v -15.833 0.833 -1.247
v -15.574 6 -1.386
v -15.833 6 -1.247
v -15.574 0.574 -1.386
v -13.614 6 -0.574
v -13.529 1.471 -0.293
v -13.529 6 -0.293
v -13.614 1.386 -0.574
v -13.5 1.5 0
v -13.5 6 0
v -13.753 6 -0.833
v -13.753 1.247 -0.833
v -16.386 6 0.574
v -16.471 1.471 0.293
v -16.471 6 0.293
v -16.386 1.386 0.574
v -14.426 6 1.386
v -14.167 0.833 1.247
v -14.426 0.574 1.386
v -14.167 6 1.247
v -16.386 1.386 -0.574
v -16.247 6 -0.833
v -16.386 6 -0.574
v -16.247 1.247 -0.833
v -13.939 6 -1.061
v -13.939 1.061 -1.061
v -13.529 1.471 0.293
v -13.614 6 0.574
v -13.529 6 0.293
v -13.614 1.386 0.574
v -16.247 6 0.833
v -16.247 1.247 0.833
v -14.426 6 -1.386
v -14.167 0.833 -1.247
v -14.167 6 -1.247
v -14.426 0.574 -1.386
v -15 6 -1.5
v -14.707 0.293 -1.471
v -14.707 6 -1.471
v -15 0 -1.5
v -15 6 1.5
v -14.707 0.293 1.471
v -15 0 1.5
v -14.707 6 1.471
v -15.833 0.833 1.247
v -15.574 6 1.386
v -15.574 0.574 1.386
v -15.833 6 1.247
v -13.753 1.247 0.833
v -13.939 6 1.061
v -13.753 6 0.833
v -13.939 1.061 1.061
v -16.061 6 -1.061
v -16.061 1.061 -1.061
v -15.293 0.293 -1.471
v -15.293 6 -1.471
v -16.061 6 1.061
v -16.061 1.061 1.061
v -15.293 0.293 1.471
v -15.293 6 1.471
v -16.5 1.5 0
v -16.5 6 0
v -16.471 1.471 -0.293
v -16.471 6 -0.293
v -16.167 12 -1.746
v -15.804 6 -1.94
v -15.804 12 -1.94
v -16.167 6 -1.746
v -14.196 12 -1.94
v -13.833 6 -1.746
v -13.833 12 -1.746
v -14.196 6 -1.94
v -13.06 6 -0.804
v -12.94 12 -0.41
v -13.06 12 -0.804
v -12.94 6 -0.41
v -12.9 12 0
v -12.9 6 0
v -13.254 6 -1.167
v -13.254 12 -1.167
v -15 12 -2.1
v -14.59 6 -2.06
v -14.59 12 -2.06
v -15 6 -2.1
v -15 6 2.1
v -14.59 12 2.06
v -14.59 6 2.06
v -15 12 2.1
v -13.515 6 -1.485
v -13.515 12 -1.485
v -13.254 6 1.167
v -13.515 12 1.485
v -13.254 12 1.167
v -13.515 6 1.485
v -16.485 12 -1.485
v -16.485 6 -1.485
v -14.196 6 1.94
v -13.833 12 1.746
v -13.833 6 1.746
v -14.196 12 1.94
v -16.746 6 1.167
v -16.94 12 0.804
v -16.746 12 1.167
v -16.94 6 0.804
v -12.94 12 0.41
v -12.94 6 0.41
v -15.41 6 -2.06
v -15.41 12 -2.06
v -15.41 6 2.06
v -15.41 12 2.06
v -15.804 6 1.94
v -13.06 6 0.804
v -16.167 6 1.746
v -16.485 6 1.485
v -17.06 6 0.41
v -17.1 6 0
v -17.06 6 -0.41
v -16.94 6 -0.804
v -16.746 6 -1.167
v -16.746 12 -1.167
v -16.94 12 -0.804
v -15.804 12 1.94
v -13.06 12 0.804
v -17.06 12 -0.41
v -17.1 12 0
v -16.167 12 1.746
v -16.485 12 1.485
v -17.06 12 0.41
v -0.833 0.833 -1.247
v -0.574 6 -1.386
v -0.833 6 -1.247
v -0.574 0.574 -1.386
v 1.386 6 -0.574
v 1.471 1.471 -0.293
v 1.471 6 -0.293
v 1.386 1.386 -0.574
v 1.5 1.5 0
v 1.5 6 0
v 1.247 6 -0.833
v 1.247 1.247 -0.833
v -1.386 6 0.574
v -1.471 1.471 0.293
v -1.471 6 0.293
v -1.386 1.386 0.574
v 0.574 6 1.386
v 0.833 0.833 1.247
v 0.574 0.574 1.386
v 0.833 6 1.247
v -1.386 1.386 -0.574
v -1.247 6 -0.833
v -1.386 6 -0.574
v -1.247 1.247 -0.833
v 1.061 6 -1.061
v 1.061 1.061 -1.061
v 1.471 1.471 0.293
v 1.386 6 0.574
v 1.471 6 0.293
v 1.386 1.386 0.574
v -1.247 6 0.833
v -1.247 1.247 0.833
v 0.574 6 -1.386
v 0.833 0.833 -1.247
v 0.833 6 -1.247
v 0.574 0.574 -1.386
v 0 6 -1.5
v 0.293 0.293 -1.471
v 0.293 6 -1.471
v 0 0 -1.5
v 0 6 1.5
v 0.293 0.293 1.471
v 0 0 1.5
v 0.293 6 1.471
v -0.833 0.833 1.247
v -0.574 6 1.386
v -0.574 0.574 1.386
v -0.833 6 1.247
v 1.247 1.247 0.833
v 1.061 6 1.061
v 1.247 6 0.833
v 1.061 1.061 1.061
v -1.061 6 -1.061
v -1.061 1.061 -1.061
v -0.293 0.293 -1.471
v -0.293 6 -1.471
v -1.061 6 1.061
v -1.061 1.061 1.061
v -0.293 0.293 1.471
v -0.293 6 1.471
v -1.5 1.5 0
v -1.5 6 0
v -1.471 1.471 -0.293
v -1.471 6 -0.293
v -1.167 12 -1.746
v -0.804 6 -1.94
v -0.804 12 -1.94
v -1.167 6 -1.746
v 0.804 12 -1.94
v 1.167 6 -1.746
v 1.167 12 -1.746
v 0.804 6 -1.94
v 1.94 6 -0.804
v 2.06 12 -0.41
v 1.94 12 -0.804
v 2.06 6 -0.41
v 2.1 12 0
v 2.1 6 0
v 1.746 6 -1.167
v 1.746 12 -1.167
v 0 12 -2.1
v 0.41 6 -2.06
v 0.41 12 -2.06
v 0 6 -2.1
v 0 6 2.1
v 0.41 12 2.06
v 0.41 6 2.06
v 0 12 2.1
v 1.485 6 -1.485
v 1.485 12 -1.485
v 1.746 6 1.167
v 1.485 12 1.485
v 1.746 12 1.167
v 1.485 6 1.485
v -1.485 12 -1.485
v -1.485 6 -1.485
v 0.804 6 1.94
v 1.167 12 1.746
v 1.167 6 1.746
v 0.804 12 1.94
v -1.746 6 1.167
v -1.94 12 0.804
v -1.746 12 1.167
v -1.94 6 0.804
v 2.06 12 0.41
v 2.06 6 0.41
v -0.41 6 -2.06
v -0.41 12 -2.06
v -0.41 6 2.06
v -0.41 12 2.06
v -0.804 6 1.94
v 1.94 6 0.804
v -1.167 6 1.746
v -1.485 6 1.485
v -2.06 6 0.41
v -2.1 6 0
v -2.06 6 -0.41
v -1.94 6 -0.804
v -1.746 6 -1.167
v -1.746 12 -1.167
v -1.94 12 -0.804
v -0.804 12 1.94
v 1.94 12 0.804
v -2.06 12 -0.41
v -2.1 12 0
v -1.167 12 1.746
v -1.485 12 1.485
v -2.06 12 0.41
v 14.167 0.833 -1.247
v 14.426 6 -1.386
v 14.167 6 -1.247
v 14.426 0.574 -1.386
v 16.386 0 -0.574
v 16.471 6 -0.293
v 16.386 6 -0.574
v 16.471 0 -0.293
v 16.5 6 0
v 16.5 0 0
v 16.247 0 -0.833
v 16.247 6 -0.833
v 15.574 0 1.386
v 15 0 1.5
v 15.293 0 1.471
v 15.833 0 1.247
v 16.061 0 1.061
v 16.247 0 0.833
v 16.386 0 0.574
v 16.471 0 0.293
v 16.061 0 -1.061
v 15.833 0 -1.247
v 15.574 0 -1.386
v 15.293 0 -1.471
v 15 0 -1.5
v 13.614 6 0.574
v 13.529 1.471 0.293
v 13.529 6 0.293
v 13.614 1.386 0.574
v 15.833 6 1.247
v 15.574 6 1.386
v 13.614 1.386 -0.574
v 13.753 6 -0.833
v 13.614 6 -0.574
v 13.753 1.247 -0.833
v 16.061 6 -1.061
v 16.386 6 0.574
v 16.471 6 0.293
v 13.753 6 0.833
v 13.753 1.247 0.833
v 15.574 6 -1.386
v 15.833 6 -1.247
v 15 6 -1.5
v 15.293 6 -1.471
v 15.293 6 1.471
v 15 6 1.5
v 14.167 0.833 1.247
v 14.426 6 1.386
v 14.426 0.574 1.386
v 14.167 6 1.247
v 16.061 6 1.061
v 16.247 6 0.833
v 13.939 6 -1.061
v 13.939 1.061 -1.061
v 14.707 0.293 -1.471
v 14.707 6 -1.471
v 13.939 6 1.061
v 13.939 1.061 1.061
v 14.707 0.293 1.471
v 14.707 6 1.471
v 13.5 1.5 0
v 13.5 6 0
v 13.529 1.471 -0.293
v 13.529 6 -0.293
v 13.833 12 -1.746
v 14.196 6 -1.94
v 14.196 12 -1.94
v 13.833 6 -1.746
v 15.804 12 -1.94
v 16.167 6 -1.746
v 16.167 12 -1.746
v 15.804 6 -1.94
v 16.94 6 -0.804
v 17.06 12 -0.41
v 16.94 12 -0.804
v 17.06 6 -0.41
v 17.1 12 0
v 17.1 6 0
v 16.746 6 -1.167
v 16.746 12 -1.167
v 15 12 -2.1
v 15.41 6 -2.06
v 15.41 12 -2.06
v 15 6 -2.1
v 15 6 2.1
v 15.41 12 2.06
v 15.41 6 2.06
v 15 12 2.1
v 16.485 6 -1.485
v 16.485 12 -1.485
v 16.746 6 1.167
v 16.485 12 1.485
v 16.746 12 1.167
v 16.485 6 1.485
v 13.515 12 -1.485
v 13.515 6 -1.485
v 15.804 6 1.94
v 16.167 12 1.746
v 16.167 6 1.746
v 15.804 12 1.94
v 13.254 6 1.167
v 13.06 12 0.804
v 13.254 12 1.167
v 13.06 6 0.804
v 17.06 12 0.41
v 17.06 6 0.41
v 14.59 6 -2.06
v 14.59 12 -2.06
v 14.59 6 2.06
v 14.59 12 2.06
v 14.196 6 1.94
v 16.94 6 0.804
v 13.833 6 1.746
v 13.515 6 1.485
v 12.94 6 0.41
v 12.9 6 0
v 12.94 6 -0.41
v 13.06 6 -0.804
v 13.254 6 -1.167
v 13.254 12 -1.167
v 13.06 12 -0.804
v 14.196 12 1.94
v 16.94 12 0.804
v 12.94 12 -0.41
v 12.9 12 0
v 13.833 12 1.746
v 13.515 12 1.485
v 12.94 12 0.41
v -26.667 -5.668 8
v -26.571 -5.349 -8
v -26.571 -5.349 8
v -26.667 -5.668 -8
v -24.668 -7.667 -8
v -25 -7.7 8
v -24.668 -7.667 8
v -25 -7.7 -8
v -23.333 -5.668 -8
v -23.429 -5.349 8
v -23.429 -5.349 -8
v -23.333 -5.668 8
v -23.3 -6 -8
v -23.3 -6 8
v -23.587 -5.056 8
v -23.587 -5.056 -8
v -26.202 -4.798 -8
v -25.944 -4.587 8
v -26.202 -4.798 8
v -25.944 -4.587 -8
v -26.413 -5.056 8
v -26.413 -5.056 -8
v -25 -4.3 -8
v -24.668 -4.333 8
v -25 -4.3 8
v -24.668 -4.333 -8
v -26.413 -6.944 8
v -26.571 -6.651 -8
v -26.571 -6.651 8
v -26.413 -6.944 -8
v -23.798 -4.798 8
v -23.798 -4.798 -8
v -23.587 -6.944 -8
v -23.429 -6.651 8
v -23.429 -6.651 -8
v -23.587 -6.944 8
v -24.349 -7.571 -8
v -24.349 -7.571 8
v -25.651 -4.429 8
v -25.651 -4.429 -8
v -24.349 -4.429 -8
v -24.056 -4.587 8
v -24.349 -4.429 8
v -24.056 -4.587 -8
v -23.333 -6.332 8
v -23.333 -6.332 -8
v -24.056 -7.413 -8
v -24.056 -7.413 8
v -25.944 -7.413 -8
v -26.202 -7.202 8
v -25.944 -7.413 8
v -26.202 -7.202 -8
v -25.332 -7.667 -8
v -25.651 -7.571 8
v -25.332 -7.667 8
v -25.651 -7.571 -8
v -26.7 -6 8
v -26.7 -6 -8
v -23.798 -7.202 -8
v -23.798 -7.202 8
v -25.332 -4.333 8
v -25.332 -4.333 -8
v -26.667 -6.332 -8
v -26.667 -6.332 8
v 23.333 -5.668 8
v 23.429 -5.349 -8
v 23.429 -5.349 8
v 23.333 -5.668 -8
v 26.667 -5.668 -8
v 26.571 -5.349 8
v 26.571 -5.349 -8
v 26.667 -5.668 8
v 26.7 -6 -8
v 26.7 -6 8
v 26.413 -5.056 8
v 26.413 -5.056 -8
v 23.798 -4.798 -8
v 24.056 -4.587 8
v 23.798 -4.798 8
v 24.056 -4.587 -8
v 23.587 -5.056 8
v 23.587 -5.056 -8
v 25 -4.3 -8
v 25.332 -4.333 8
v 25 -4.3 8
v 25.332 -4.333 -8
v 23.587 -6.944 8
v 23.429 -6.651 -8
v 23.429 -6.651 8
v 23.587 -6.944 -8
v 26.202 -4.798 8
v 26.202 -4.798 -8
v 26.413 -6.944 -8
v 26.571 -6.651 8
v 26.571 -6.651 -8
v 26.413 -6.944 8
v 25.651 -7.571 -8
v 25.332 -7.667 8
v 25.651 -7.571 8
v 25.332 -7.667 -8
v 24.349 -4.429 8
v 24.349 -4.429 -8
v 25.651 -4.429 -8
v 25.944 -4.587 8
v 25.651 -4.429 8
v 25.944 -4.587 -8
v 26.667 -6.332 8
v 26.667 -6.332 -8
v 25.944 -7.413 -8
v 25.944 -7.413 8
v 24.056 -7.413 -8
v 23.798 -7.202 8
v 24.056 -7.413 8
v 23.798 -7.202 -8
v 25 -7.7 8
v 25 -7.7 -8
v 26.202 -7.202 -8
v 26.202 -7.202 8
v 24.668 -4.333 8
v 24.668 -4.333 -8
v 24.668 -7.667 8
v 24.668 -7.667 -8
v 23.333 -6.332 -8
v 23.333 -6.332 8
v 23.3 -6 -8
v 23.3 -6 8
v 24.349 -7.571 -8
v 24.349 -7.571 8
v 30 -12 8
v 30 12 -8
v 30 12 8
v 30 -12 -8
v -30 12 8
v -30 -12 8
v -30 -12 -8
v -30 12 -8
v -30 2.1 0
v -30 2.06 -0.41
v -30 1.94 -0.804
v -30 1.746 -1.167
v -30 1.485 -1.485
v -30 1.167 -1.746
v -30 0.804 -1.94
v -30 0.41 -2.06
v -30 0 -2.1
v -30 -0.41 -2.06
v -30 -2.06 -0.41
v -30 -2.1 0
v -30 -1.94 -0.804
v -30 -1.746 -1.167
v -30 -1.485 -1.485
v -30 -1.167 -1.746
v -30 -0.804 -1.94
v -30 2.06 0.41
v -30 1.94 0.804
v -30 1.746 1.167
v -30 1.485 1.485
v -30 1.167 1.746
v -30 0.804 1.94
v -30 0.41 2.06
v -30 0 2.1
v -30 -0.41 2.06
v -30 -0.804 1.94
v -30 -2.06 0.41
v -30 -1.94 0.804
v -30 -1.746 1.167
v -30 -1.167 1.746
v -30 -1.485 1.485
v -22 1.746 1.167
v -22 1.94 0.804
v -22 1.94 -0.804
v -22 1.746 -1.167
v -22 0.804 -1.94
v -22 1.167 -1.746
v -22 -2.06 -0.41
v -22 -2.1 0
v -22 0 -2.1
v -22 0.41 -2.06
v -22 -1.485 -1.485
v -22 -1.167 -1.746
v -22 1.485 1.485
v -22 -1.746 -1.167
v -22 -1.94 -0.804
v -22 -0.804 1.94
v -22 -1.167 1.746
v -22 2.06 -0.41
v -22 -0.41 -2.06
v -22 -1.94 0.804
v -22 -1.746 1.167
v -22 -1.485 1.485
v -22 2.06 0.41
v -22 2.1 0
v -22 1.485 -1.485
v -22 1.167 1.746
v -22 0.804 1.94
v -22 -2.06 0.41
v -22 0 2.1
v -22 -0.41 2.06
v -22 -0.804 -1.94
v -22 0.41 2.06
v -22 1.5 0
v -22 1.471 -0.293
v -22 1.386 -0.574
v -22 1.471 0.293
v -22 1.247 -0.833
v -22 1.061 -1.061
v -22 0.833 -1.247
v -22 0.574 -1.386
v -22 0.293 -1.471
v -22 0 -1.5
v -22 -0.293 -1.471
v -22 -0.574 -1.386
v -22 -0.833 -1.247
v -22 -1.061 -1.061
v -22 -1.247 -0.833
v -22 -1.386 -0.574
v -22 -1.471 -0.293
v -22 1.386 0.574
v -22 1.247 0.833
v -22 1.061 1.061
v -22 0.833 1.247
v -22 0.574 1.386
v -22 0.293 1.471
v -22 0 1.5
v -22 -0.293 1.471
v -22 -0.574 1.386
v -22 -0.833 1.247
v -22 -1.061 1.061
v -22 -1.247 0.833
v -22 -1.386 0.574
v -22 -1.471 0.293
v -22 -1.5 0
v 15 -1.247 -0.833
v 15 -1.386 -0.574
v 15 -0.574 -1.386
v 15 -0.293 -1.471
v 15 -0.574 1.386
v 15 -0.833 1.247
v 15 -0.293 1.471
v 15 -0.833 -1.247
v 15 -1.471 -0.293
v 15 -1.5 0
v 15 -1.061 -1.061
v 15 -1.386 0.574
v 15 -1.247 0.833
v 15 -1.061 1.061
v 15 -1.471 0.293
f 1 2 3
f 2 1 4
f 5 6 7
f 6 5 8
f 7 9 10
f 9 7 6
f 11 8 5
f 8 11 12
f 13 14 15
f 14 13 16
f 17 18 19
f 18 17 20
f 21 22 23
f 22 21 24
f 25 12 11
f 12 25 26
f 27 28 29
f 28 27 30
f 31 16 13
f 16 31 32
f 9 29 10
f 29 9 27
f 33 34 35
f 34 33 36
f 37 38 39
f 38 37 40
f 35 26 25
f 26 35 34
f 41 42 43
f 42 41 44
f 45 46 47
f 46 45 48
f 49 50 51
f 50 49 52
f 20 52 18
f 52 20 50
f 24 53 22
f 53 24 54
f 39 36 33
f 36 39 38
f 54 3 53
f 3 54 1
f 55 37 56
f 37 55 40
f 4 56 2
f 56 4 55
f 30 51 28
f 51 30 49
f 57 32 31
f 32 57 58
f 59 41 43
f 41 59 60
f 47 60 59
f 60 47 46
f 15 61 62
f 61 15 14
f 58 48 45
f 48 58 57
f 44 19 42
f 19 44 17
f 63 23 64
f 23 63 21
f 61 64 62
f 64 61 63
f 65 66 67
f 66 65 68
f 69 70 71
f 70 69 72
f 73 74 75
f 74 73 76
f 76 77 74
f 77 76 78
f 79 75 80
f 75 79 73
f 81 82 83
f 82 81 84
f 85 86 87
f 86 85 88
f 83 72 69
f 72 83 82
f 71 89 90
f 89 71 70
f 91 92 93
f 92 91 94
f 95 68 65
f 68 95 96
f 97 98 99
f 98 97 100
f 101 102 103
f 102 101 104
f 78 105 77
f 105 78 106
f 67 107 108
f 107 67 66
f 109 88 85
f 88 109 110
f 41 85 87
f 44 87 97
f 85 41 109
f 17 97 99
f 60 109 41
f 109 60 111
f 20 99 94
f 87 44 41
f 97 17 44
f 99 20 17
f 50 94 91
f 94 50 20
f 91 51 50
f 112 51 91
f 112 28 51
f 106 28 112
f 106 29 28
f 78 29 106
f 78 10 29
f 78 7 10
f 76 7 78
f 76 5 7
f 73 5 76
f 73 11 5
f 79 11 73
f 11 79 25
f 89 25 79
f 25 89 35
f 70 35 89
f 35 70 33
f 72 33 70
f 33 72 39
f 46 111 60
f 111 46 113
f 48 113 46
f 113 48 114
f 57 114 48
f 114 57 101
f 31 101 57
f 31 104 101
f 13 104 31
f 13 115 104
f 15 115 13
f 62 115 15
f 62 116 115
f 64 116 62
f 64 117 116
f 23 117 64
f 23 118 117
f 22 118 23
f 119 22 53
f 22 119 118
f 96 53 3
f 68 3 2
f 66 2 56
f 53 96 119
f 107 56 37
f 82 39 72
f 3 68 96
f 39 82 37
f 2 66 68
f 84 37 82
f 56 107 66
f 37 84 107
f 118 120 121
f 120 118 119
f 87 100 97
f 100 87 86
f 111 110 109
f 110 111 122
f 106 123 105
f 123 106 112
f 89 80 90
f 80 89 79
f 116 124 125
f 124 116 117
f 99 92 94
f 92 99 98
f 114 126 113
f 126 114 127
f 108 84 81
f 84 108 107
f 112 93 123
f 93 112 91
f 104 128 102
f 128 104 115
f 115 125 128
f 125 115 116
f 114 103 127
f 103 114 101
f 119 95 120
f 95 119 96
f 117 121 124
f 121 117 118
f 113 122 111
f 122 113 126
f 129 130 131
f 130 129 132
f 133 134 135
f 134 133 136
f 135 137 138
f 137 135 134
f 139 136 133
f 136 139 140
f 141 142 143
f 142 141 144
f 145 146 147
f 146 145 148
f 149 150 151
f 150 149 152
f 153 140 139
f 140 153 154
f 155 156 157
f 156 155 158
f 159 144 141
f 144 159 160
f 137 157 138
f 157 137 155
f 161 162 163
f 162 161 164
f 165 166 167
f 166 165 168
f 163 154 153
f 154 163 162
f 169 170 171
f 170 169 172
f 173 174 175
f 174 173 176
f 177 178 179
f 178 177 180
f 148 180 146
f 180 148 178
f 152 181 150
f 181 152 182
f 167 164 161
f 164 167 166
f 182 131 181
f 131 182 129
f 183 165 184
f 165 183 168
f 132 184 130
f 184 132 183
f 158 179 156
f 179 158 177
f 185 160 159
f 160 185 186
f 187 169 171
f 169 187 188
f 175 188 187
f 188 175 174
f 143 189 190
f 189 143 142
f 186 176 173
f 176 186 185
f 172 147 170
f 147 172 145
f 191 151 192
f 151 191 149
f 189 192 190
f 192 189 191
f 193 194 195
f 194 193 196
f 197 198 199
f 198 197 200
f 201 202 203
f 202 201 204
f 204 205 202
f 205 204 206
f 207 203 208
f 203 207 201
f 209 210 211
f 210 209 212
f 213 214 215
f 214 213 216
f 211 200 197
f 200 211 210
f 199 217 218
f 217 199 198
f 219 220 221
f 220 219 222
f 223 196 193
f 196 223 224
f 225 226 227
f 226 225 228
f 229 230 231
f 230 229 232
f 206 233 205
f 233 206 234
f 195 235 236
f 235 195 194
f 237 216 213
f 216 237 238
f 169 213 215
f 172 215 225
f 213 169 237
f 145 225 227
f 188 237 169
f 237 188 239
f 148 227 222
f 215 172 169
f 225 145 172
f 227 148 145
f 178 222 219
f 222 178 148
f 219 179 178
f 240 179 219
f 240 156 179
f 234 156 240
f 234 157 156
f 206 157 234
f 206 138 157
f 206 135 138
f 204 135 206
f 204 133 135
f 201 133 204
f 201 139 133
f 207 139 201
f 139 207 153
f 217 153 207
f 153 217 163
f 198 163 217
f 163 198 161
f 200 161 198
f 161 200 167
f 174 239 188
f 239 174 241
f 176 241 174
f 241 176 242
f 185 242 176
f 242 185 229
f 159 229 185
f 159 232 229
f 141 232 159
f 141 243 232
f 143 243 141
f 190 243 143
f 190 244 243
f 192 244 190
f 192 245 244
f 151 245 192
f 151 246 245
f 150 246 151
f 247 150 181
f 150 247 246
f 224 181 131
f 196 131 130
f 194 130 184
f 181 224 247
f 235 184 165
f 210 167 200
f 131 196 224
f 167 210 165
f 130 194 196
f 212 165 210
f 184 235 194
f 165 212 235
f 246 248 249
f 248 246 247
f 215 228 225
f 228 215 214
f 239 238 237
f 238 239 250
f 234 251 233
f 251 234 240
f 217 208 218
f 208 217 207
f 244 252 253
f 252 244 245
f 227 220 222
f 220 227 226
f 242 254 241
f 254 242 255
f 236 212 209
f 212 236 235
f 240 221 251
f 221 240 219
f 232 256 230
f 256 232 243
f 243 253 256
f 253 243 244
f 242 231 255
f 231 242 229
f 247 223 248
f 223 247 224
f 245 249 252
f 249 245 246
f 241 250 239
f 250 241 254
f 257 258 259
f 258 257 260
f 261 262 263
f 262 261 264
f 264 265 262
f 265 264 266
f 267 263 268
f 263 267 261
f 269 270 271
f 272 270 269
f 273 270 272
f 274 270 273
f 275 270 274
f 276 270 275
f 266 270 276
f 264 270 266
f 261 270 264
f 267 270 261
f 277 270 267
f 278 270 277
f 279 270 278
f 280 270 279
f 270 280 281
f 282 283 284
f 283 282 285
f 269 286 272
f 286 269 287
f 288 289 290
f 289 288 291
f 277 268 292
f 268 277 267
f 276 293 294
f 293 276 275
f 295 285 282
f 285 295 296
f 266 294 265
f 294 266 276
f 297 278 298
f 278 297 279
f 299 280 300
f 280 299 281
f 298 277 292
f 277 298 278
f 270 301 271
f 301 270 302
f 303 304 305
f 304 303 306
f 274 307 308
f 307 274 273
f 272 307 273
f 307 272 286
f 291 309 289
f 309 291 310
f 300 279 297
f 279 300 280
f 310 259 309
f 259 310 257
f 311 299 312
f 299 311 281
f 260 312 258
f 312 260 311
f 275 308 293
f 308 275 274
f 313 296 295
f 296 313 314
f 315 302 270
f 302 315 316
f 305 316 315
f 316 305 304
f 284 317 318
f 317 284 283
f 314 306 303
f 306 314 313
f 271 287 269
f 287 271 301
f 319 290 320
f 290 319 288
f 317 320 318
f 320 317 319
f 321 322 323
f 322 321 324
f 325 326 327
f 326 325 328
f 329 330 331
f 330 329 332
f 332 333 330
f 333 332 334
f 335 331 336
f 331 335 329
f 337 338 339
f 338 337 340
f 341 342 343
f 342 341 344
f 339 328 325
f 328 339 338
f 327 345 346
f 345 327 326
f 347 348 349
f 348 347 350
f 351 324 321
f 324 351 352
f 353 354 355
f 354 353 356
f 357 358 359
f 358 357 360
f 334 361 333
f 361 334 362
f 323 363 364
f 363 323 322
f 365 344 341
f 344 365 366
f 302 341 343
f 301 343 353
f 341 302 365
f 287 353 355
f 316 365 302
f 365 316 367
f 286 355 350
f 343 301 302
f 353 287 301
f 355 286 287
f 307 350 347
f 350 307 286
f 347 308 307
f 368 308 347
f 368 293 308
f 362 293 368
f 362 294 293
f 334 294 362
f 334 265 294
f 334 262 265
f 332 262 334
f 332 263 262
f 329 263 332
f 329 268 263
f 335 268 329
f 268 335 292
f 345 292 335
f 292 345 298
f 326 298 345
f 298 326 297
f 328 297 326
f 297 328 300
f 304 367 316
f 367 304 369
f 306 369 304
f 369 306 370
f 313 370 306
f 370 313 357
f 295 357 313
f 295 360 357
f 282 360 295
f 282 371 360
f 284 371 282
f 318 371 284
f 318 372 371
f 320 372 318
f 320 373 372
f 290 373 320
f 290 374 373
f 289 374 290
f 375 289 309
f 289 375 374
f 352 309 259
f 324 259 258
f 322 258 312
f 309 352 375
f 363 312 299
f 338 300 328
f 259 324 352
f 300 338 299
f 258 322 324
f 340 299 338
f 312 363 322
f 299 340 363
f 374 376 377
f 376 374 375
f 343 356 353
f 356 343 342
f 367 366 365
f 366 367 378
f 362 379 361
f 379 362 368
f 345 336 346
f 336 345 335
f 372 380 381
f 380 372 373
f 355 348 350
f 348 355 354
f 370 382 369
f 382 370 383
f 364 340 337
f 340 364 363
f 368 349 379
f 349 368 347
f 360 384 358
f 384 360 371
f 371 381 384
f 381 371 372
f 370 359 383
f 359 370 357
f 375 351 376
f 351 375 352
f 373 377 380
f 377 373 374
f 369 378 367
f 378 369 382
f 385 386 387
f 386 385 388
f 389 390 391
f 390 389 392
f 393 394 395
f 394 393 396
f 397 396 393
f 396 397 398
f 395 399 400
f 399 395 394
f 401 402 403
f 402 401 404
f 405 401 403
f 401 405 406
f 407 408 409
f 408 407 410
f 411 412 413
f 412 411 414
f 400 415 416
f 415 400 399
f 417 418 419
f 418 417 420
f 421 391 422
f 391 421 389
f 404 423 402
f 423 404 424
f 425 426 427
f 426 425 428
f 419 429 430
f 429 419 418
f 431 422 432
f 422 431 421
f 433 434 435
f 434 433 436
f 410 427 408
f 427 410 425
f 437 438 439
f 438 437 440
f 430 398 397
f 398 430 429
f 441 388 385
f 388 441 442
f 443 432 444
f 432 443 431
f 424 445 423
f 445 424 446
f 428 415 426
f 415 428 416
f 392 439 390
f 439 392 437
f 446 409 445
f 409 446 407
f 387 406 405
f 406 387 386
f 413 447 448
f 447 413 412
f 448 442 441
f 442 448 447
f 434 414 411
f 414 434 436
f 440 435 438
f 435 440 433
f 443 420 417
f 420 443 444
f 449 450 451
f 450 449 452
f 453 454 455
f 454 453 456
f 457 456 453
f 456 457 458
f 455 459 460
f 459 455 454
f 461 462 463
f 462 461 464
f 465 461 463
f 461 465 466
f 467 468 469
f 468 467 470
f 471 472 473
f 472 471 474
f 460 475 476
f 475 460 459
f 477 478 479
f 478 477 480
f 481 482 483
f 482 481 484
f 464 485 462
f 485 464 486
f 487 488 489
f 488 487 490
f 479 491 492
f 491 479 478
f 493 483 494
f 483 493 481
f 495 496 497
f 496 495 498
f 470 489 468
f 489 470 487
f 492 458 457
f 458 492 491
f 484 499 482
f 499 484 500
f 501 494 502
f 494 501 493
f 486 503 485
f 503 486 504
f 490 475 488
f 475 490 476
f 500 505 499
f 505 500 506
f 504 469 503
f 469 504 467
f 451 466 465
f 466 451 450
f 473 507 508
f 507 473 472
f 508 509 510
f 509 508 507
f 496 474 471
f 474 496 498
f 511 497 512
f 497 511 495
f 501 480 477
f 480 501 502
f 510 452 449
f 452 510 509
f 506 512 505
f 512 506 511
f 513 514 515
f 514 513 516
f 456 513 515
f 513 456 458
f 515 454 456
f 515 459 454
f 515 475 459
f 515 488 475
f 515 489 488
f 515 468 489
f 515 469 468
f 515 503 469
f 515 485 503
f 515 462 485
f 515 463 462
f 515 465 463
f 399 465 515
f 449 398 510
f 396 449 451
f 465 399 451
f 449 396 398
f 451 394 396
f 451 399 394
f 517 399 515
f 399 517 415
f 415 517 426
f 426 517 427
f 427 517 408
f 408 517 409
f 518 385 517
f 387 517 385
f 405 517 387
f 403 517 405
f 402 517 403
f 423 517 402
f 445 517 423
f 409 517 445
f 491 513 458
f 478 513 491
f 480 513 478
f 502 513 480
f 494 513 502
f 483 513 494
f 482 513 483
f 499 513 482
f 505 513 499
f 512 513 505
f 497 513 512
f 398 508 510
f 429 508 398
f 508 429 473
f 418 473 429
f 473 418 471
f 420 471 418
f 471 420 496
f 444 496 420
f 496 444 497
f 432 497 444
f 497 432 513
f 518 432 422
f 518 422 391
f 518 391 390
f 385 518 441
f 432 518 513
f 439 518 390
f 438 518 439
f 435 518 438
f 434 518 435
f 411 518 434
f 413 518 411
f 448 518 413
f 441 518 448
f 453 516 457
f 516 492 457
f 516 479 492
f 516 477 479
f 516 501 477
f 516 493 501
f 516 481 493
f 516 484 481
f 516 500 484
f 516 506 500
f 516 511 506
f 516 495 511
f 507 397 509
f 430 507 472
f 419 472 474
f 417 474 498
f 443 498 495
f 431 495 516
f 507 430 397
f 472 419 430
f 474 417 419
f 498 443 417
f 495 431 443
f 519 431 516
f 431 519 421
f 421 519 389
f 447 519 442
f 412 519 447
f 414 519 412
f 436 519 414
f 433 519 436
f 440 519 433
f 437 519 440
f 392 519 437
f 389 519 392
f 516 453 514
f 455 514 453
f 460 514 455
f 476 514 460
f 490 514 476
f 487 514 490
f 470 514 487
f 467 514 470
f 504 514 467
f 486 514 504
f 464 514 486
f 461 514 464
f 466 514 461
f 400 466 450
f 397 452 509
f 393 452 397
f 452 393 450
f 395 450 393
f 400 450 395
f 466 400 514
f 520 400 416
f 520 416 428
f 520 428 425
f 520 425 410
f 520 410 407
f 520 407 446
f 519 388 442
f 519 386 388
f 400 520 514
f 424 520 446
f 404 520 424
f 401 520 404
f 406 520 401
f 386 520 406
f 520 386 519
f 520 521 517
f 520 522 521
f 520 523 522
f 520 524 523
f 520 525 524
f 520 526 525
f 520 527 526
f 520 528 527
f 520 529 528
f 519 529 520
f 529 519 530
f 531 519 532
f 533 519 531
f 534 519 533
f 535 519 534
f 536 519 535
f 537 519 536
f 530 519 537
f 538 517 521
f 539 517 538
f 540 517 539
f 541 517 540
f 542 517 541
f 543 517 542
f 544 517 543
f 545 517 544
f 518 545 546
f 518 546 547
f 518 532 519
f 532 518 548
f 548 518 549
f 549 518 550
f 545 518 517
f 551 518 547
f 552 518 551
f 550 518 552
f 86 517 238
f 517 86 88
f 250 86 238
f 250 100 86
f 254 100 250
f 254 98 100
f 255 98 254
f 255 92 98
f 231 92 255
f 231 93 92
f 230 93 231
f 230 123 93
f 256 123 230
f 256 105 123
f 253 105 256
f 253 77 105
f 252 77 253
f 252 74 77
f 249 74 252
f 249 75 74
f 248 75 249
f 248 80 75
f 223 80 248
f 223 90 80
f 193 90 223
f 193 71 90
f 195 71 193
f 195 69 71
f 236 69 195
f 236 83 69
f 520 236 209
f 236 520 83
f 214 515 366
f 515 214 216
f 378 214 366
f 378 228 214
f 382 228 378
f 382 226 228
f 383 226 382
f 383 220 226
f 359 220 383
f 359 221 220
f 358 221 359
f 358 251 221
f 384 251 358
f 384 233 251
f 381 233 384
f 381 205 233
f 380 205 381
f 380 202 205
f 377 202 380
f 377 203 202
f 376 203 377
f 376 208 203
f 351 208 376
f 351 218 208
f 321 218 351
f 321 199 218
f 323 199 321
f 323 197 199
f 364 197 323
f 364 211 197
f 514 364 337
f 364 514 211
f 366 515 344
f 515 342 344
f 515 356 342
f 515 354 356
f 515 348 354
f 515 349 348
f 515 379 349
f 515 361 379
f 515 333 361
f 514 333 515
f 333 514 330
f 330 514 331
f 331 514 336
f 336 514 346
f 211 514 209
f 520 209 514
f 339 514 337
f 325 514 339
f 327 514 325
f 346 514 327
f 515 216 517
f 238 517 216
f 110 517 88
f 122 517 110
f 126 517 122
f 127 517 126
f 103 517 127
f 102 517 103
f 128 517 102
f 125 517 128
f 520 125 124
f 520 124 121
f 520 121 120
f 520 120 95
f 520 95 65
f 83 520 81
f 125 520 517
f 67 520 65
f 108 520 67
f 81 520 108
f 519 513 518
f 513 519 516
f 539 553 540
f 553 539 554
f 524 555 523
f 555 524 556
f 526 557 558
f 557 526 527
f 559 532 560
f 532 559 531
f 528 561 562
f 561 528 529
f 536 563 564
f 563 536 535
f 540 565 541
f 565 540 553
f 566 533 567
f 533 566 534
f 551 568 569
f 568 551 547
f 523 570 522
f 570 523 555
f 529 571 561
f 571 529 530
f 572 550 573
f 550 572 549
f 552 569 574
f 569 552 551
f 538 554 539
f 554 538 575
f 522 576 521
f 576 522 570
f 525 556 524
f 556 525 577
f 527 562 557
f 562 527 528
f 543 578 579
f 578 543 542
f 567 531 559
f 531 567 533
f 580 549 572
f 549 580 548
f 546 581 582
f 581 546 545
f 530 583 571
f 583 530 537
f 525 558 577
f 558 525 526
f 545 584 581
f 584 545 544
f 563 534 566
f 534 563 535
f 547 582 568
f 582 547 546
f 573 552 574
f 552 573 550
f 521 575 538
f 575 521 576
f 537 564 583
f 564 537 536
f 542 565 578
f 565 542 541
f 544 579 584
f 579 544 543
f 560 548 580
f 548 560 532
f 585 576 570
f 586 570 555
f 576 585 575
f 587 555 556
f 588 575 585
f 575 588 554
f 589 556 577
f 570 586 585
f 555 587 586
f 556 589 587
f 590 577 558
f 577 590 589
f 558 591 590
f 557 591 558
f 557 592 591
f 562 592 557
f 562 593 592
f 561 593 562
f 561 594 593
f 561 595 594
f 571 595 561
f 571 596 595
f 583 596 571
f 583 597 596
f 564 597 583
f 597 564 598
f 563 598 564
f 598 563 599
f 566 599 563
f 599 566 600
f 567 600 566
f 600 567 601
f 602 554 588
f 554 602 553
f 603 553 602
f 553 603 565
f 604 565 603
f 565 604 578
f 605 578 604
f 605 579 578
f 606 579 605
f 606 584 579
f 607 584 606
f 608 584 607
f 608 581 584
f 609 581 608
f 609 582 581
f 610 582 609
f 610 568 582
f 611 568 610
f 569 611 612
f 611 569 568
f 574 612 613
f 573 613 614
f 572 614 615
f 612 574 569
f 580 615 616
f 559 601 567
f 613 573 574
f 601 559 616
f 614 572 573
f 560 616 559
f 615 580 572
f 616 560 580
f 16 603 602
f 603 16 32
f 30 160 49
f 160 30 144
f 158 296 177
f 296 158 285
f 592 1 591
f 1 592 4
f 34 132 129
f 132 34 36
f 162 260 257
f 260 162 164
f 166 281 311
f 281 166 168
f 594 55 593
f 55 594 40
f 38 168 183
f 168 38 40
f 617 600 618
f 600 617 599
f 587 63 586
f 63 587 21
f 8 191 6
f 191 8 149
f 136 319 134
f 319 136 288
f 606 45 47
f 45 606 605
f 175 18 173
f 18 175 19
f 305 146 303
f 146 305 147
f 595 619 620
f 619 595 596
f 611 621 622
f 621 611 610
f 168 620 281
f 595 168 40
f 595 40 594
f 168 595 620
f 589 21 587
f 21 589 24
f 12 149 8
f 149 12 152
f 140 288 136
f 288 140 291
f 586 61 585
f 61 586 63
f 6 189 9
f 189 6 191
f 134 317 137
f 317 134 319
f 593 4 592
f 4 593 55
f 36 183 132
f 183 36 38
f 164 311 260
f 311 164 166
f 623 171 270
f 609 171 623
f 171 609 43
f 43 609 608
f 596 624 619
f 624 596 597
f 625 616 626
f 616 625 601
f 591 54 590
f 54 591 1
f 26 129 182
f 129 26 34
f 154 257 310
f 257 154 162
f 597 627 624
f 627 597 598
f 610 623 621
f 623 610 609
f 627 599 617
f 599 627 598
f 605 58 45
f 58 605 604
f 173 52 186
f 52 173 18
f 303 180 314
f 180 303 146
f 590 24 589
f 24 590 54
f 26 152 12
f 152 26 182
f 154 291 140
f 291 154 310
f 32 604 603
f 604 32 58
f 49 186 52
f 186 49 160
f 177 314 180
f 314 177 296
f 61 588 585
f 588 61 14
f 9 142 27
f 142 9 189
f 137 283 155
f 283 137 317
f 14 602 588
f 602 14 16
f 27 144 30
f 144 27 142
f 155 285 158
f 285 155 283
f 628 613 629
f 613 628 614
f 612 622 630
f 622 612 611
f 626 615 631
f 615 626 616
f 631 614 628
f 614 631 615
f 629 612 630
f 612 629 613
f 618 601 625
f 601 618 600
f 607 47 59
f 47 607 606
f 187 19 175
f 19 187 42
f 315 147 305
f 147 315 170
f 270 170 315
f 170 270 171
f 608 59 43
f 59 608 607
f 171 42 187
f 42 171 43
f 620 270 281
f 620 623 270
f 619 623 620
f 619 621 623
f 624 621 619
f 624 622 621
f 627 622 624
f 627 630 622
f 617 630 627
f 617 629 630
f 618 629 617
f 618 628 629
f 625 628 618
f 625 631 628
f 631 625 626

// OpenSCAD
// KNOWN-RIGHT ALTERNATIVE (must pass): a correct part coded independently, a centred cube with rotated cylinder cutters
$fn=32;
difference(){ cube([60,24,16],center=true);
 rotate([0,90,0]) translate([0,0,-31]) cylinder(d=4.2,h=9);
 rotate([0,90,0]) translate([0,0,-31]) cylinder(d=3,h=46);
 for(x=[-15,0,15]) translate([x,0,0]) rotate([-90,0,0]) { cylinder(d=3,h=13); translate([0,0,6]) cylinder(d=4.2,h=7); }
 for(x=[-25,25]) translate([x,-6,0]) cylinder(d=3.4,h=20,center=true); }
